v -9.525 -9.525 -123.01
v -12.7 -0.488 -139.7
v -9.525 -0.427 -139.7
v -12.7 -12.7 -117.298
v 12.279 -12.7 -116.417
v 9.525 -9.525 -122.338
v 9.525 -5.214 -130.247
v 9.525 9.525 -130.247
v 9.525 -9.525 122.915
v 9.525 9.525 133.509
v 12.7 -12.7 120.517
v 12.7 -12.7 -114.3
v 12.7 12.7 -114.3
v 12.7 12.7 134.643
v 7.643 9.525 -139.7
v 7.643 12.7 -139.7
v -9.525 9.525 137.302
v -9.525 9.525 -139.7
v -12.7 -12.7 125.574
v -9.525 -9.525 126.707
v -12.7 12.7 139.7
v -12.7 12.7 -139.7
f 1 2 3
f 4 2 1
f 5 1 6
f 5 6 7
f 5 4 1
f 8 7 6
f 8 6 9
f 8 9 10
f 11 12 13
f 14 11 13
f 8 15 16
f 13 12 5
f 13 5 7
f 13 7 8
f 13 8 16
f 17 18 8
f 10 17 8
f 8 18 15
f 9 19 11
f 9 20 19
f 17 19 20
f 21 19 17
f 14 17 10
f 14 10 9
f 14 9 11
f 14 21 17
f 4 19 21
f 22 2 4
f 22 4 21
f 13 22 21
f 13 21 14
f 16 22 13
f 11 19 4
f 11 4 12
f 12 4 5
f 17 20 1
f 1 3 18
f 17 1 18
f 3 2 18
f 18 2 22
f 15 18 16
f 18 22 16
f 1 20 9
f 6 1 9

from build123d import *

# Parameters (mm, degrees)
BOSS_EXTRUDE1_DEPTH      = 139.7
BOSS_EXTRUDE1_DEPTH_BACK = 139.7
SKETCH3_W                = 25.4
SKETCH3_H                = 25.4
SKETCH3_W_2              = 19.05
SKETCH3_H_2              = 19.05


with BuildPart() as part:
    # Sketch3 → Boss-Extrude1 (new, two sides: drawn at the far end of the back side and taken through both)
    with BuildSketch(Plane.XY.offset(-BOSS_EXTRUDE1_DEPTH_BACK)):
        Rectangle(SKETCH3_W, SKETCH3_H)
        Rectangle(SKETCH3_W_2, SKETCH3_H_2, mode=Mode.SUBTRACT)
    extrude(amount=BOSS_EXTRUDE1_DEPTH + BOSS_EXTRUDE1_DEPTH_BACK)

    # SurfaceCut2
    split(bisect_by=Plane(origin=(19.203056865, -53.641884581, 96.452303833), x_dir=(0.9807512157806098, 0, -0.1952614983678451), z_dir=(0.17141995510435715, -0.47884508758591265, 0.8610009181684186)), keep=Keep.BOTTOM)

    # SurfaceCut4
    split(bisect_by=Plane(origin=(34.104573835, 0, -6.790009618), x_dir=(0, 1, 0), z_dir=(0.9807512157806096, 0, -0.19526149836784543)), keep=Keep.BOTTOM)

    # SurfaceCut6
    split(bisect_by=Plane(origin=(1.132350751, -58.878507635, -32.094967554), x_dir=(0.9998151166046026, 0.01922843230544169, 0), z_dir=(0.01688375098917382, -0.8778994145657232, -0.478547340247228)), keep=Keep.BOTTOM)


solid = part.part
